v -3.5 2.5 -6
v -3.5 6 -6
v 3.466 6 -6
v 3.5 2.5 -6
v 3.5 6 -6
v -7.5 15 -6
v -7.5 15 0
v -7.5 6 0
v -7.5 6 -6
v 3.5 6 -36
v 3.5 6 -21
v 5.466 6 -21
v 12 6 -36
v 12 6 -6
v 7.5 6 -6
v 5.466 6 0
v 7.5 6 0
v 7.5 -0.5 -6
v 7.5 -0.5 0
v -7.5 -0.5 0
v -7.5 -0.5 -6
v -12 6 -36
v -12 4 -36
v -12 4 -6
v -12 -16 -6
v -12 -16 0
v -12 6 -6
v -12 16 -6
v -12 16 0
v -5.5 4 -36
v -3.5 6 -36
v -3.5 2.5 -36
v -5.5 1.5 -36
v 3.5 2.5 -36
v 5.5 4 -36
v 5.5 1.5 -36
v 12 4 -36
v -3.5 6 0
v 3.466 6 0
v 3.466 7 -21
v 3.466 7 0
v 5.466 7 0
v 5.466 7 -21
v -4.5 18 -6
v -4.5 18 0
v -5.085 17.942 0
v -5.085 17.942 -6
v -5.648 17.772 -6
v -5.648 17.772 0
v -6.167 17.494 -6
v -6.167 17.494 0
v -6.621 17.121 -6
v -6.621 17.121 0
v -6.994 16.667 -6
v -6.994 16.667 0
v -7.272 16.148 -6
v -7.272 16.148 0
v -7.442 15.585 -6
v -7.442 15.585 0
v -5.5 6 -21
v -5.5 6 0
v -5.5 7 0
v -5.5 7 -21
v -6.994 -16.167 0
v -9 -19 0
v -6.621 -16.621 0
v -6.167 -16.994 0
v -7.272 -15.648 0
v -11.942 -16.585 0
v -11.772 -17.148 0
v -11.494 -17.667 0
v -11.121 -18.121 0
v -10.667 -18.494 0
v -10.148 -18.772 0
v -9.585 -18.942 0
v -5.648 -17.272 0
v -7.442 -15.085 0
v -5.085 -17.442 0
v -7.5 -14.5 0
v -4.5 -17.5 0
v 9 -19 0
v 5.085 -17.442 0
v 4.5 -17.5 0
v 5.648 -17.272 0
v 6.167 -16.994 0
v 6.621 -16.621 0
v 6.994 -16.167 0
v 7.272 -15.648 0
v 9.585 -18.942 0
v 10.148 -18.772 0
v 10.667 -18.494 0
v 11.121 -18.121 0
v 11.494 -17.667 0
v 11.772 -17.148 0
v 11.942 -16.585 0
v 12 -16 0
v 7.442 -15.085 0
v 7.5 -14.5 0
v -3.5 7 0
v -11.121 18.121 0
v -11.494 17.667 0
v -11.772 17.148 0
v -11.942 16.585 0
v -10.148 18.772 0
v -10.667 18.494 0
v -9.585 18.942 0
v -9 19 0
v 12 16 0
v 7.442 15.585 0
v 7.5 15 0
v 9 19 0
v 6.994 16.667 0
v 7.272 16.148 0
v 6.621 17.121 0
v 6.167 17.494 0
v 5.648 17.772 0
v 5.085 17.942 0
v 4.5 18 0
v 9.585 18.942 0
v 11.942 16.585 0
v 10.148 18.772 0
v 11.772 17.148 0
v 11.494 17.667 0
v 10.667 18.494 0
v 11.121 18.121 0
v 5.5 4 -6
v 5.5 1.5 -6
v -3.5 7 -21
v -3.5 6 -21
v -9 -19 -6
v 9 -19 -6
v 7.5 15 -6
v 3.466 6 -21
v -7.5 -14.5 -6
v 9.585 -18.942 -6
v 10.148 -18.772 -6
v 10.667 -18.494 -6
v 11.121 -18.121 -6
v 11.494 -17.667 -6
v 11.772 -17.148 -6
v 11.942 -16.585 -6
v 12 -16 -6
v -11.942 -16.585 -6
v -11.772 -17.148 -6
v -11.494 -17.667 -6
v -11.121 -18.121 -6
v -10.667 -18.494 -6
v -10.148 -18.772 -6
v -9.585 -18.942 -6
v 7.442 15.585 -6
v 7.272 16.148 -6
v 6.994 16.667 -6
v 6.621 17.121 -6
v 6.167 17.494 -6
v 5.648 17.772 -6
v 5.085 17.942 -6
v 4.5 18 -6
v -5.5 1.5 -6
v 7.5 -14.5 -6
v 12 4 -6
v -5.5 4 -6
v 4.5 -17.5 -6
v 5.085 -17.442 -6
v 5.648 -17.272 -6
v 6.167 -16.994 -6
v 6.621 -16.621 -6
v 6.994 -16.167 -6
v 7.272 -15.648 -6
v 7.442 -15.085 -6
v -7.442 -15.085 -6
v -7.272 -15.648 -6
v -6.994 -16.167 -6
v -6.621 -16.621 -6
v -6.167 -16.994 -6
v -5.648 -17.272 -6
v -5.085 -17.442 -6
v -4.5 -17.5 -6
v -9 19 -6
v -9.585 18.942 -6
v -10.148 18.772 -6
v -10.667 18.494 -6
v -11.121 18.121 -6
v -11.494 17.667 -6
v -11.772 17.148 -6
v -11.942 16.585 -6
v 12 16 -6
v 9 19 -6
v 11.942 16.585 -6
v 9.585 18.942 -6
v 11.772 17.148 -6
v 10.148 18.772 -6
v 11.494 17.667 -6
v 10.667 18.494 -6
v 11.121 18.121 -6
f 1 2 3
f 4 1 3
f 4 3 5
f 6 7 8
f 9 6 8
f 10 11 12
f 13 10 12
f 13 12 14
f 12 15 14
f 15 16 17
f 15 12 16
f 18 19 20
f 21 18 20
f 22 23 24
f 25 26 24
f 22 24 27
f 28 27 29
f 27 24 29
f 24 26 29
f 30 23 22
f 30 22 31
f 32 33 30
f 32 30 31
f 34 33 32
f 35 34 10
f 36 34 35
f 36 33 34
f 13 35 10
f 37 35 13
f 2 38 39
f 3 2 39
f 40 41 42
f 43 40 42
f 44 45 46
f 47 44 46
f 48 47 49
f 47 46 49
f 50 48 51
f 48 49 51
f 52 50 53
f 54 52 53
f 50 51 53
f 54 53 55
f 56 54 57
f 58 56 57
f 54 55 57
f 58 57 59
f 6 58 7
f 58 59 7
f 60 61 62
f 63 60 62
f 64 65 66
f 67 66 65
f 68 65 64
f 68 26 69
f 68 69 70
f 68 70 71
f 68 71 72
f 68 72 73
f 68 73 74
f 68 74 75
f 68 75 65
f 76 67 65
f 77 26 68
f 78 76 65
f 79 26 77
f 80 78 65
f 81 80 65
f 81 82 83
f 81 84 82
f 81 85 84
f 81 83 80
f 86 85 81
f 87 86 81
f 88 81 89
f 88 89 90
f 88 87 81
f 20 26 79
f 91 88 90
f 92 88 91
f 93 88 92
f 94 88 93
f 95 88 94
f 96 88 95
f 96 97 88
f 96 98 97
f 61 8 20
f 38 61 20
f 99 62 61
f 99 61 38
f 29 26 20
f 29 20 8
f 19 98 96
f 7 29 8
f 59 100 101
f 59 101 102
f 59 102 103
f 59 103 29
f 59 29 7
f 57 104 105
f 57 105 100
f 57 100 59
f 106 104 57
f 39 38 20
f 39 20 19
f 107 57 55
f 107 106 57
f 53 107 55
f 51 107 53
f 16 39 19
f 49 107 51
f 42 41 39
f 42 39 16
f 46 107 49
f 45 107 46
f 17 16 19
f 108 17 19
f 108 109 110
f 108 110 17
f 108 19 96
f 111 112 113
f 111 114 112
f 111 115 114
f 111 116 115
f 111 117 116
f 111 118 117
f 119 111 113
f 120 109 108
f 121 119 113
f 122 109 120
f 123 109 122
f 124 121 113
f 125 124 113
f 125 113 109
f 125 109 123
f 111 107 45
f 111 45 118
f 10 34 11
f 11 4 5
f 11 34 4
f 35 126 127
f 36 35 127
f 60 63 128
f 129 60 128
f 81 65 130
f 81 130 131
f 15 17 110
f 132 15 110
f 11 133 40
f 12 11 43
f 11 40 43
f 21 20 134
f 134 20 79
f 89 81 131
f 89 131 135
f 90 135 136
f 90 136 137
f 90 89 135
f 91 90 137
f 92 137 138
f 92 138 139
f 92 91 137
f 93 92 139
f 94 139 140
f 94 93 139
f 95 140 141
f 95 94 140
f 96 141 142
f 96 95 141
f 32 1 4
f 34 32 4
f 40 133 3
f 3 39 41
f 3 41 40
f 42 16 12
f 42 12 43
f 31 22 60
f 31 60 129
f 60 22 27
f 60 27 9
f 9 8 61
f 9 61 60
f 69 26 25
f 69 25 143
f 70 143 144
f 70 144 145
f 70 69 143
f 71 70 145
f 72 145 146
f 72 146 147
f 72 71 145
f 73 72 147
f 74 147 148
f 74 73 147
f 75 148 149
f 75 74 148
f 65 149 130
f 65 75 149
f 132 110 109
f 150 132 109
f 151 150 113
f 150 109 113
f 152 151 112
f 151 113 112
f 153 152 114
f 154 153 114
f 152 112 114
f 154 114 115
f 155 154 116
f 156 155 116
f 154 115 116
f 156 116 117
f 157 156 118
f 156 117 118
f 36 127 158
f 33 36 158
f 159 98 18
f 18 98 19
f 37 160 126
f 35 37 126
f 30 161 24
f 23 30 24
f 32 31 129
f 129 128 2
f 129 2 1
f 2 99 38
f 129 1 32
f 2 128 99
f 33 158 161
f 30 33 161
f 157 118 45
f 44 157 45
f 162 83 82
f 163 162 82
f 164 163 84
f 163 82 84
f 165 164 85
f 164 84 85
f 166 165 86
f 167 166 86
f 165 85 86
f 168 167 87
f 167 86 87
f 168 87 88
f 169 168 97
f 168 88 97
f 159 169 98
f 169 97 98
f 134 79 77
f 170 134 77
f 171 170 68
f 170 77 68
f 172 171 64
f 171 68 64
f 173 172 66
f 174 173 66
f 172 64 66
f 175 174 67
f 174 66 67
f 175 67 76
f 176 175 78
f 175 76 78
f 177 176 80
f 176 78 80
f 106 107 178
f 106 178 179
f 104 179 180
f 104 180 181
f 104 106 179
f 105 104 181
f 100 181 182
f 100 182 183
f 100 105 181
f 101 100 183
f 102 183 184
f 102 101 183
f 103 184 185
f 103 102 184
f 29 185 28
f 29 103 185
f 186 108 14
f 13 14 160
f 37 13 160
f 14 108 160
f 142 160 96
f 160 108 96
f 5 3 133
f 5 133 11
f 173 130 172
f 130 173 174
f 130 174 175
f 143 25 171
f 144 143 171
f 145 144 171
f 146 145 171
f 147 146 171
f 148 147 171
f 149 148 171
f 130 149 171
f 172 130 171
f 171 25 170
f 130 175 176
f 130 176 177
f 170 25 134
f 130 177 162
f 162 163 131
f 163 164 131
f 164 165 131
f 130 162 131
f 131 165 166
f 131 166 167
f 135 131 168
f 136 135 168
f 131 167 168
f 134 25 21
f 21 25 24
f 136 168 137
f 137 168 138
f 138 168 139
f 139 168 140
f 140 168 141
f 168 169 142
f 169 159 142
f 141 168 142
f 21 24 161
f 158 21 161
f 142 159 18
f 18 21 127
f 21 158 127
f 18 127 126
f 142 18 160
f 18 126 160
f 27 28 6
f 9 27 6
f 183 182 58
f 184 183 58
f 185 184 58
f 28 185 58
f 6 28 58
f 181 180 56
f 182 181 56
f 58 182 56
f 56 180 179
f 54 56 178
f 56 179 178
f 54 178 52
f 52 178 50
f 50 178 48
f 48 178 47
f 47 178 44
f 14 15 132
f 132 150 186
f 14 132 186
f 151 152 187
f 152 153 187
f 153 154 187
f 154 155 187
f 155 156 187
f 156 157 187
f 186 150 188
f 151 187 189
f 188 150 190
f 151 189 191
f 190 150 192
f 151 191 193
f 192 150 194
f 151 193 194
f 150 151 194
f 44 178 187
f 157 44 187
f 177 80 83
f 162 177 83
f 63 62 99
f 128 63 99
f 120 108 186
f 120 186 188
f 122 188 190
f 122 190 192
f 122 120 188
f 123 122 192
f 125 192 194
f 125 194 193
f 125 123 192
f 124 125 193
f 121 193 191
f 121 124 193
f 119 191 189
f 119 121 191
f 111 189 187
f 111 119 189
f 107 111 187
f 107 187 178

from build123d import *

# Parameters (mm, degrees)
F1_DEPTH = 6
F3_DEPTH = 6
F5_DEPTH = 30
F6_W     = 2
F6_H     = 1
F7_DEPTH = 21


with BuildPart() as f1:
    # F0 (on Top) → F1 (new body)
    with BuildSketch(Plane.XY):
        with BuildLine():
            ThreePointArc((12, 16), (11.1213203436, 18.1213203436), (9, 19))
            Line((9, 19), (-9, 19))
            ThreePointArc((-9, 19), (-11.1213203436, 18.1213203436), (-12, 16))
            Line((-12, 16), (-12, -16))
            ThreePointArc((-12, -16), (-11.1213203436, -18.1213203436), (-9, -19))
            Line((-9, -19), (9, -19))
            ThreePointArc((9, -19), (11.1213203436, -18.1213203436), (12, -16))
            Line((12, -16), (12, 16))
        make_face()
    extrude(amount=-F1_DEPTH)

    # F2 (on face) → F3 (cut, through all)
    with BuildSketch(Plane.XY):
        with BuildLine():
            ThreePointArc((7.5, 15), (6.6213203436, 17.1213203436), (4.5, 18))
            Line((4.5, 18), (-4.5, 18))
            ThreePointArc((-4.5, 18), (-6.6213203436, 17.1213203436), (-7.5, 15))
            Line((-7.5, 15), (-7.5, 6))
            Line((-7.5, 6), (7.5, 6))
            Line((7.5, 6), (7.5, 15))
        make_face()
        with BuildLine():
            Line((7.5, -14.5), (7.5, -0.5))
            Line((7.5, -0.5), (-7.5, -0.5))
            Line((-7.5, -0.5), (-7.5, -14.5))
            ThreePointArc((-7.5, -14.5), (-6.6213203436, -16.6213203436), (-4.5, -17.5))
            Line((-4.5, -17.5), (4.5, -17.5))
            ThreePointArc((4.5, -17.5), (6.6213203436, -16.6213203436), (7.5, -14.5))
        make_face()
    extrude(amount=-F3_DEPTH, mode=Mode.SUBTRACT)

    # F4 (on face) → F5 (join)
    with BuildSketch(Plane(origin=(0, 0, -6), x_dir=(1, 0, 0), z_dir=(0, 0, -1))):
        Polygon((-3.5, -2.5), (3.5, -2.5), (3.5, -6), (7.5, -6), (12, -6), (12, -4), (5.5, -4), (5.5, -1.5), (-5.5, -1.5), (-5.5, -4), (-12, -4), (-12, -6), (-7.5, -6), (-3.5, -6), align=None)
    extrude(amount=F5_DEPTH)

    # F6 (on face) → F7 (join)
    with BuildSketch(Plane.XY):
        with Locations((-4.5, 6.5)):
            Rectangle(F6_W, F6_H)
        with Locations((4.4662822727, 6.5)):
            Rectangle(F6_W, F6_H)
    extrude(amount=-F7_DEPTH)


solid = f1.part
